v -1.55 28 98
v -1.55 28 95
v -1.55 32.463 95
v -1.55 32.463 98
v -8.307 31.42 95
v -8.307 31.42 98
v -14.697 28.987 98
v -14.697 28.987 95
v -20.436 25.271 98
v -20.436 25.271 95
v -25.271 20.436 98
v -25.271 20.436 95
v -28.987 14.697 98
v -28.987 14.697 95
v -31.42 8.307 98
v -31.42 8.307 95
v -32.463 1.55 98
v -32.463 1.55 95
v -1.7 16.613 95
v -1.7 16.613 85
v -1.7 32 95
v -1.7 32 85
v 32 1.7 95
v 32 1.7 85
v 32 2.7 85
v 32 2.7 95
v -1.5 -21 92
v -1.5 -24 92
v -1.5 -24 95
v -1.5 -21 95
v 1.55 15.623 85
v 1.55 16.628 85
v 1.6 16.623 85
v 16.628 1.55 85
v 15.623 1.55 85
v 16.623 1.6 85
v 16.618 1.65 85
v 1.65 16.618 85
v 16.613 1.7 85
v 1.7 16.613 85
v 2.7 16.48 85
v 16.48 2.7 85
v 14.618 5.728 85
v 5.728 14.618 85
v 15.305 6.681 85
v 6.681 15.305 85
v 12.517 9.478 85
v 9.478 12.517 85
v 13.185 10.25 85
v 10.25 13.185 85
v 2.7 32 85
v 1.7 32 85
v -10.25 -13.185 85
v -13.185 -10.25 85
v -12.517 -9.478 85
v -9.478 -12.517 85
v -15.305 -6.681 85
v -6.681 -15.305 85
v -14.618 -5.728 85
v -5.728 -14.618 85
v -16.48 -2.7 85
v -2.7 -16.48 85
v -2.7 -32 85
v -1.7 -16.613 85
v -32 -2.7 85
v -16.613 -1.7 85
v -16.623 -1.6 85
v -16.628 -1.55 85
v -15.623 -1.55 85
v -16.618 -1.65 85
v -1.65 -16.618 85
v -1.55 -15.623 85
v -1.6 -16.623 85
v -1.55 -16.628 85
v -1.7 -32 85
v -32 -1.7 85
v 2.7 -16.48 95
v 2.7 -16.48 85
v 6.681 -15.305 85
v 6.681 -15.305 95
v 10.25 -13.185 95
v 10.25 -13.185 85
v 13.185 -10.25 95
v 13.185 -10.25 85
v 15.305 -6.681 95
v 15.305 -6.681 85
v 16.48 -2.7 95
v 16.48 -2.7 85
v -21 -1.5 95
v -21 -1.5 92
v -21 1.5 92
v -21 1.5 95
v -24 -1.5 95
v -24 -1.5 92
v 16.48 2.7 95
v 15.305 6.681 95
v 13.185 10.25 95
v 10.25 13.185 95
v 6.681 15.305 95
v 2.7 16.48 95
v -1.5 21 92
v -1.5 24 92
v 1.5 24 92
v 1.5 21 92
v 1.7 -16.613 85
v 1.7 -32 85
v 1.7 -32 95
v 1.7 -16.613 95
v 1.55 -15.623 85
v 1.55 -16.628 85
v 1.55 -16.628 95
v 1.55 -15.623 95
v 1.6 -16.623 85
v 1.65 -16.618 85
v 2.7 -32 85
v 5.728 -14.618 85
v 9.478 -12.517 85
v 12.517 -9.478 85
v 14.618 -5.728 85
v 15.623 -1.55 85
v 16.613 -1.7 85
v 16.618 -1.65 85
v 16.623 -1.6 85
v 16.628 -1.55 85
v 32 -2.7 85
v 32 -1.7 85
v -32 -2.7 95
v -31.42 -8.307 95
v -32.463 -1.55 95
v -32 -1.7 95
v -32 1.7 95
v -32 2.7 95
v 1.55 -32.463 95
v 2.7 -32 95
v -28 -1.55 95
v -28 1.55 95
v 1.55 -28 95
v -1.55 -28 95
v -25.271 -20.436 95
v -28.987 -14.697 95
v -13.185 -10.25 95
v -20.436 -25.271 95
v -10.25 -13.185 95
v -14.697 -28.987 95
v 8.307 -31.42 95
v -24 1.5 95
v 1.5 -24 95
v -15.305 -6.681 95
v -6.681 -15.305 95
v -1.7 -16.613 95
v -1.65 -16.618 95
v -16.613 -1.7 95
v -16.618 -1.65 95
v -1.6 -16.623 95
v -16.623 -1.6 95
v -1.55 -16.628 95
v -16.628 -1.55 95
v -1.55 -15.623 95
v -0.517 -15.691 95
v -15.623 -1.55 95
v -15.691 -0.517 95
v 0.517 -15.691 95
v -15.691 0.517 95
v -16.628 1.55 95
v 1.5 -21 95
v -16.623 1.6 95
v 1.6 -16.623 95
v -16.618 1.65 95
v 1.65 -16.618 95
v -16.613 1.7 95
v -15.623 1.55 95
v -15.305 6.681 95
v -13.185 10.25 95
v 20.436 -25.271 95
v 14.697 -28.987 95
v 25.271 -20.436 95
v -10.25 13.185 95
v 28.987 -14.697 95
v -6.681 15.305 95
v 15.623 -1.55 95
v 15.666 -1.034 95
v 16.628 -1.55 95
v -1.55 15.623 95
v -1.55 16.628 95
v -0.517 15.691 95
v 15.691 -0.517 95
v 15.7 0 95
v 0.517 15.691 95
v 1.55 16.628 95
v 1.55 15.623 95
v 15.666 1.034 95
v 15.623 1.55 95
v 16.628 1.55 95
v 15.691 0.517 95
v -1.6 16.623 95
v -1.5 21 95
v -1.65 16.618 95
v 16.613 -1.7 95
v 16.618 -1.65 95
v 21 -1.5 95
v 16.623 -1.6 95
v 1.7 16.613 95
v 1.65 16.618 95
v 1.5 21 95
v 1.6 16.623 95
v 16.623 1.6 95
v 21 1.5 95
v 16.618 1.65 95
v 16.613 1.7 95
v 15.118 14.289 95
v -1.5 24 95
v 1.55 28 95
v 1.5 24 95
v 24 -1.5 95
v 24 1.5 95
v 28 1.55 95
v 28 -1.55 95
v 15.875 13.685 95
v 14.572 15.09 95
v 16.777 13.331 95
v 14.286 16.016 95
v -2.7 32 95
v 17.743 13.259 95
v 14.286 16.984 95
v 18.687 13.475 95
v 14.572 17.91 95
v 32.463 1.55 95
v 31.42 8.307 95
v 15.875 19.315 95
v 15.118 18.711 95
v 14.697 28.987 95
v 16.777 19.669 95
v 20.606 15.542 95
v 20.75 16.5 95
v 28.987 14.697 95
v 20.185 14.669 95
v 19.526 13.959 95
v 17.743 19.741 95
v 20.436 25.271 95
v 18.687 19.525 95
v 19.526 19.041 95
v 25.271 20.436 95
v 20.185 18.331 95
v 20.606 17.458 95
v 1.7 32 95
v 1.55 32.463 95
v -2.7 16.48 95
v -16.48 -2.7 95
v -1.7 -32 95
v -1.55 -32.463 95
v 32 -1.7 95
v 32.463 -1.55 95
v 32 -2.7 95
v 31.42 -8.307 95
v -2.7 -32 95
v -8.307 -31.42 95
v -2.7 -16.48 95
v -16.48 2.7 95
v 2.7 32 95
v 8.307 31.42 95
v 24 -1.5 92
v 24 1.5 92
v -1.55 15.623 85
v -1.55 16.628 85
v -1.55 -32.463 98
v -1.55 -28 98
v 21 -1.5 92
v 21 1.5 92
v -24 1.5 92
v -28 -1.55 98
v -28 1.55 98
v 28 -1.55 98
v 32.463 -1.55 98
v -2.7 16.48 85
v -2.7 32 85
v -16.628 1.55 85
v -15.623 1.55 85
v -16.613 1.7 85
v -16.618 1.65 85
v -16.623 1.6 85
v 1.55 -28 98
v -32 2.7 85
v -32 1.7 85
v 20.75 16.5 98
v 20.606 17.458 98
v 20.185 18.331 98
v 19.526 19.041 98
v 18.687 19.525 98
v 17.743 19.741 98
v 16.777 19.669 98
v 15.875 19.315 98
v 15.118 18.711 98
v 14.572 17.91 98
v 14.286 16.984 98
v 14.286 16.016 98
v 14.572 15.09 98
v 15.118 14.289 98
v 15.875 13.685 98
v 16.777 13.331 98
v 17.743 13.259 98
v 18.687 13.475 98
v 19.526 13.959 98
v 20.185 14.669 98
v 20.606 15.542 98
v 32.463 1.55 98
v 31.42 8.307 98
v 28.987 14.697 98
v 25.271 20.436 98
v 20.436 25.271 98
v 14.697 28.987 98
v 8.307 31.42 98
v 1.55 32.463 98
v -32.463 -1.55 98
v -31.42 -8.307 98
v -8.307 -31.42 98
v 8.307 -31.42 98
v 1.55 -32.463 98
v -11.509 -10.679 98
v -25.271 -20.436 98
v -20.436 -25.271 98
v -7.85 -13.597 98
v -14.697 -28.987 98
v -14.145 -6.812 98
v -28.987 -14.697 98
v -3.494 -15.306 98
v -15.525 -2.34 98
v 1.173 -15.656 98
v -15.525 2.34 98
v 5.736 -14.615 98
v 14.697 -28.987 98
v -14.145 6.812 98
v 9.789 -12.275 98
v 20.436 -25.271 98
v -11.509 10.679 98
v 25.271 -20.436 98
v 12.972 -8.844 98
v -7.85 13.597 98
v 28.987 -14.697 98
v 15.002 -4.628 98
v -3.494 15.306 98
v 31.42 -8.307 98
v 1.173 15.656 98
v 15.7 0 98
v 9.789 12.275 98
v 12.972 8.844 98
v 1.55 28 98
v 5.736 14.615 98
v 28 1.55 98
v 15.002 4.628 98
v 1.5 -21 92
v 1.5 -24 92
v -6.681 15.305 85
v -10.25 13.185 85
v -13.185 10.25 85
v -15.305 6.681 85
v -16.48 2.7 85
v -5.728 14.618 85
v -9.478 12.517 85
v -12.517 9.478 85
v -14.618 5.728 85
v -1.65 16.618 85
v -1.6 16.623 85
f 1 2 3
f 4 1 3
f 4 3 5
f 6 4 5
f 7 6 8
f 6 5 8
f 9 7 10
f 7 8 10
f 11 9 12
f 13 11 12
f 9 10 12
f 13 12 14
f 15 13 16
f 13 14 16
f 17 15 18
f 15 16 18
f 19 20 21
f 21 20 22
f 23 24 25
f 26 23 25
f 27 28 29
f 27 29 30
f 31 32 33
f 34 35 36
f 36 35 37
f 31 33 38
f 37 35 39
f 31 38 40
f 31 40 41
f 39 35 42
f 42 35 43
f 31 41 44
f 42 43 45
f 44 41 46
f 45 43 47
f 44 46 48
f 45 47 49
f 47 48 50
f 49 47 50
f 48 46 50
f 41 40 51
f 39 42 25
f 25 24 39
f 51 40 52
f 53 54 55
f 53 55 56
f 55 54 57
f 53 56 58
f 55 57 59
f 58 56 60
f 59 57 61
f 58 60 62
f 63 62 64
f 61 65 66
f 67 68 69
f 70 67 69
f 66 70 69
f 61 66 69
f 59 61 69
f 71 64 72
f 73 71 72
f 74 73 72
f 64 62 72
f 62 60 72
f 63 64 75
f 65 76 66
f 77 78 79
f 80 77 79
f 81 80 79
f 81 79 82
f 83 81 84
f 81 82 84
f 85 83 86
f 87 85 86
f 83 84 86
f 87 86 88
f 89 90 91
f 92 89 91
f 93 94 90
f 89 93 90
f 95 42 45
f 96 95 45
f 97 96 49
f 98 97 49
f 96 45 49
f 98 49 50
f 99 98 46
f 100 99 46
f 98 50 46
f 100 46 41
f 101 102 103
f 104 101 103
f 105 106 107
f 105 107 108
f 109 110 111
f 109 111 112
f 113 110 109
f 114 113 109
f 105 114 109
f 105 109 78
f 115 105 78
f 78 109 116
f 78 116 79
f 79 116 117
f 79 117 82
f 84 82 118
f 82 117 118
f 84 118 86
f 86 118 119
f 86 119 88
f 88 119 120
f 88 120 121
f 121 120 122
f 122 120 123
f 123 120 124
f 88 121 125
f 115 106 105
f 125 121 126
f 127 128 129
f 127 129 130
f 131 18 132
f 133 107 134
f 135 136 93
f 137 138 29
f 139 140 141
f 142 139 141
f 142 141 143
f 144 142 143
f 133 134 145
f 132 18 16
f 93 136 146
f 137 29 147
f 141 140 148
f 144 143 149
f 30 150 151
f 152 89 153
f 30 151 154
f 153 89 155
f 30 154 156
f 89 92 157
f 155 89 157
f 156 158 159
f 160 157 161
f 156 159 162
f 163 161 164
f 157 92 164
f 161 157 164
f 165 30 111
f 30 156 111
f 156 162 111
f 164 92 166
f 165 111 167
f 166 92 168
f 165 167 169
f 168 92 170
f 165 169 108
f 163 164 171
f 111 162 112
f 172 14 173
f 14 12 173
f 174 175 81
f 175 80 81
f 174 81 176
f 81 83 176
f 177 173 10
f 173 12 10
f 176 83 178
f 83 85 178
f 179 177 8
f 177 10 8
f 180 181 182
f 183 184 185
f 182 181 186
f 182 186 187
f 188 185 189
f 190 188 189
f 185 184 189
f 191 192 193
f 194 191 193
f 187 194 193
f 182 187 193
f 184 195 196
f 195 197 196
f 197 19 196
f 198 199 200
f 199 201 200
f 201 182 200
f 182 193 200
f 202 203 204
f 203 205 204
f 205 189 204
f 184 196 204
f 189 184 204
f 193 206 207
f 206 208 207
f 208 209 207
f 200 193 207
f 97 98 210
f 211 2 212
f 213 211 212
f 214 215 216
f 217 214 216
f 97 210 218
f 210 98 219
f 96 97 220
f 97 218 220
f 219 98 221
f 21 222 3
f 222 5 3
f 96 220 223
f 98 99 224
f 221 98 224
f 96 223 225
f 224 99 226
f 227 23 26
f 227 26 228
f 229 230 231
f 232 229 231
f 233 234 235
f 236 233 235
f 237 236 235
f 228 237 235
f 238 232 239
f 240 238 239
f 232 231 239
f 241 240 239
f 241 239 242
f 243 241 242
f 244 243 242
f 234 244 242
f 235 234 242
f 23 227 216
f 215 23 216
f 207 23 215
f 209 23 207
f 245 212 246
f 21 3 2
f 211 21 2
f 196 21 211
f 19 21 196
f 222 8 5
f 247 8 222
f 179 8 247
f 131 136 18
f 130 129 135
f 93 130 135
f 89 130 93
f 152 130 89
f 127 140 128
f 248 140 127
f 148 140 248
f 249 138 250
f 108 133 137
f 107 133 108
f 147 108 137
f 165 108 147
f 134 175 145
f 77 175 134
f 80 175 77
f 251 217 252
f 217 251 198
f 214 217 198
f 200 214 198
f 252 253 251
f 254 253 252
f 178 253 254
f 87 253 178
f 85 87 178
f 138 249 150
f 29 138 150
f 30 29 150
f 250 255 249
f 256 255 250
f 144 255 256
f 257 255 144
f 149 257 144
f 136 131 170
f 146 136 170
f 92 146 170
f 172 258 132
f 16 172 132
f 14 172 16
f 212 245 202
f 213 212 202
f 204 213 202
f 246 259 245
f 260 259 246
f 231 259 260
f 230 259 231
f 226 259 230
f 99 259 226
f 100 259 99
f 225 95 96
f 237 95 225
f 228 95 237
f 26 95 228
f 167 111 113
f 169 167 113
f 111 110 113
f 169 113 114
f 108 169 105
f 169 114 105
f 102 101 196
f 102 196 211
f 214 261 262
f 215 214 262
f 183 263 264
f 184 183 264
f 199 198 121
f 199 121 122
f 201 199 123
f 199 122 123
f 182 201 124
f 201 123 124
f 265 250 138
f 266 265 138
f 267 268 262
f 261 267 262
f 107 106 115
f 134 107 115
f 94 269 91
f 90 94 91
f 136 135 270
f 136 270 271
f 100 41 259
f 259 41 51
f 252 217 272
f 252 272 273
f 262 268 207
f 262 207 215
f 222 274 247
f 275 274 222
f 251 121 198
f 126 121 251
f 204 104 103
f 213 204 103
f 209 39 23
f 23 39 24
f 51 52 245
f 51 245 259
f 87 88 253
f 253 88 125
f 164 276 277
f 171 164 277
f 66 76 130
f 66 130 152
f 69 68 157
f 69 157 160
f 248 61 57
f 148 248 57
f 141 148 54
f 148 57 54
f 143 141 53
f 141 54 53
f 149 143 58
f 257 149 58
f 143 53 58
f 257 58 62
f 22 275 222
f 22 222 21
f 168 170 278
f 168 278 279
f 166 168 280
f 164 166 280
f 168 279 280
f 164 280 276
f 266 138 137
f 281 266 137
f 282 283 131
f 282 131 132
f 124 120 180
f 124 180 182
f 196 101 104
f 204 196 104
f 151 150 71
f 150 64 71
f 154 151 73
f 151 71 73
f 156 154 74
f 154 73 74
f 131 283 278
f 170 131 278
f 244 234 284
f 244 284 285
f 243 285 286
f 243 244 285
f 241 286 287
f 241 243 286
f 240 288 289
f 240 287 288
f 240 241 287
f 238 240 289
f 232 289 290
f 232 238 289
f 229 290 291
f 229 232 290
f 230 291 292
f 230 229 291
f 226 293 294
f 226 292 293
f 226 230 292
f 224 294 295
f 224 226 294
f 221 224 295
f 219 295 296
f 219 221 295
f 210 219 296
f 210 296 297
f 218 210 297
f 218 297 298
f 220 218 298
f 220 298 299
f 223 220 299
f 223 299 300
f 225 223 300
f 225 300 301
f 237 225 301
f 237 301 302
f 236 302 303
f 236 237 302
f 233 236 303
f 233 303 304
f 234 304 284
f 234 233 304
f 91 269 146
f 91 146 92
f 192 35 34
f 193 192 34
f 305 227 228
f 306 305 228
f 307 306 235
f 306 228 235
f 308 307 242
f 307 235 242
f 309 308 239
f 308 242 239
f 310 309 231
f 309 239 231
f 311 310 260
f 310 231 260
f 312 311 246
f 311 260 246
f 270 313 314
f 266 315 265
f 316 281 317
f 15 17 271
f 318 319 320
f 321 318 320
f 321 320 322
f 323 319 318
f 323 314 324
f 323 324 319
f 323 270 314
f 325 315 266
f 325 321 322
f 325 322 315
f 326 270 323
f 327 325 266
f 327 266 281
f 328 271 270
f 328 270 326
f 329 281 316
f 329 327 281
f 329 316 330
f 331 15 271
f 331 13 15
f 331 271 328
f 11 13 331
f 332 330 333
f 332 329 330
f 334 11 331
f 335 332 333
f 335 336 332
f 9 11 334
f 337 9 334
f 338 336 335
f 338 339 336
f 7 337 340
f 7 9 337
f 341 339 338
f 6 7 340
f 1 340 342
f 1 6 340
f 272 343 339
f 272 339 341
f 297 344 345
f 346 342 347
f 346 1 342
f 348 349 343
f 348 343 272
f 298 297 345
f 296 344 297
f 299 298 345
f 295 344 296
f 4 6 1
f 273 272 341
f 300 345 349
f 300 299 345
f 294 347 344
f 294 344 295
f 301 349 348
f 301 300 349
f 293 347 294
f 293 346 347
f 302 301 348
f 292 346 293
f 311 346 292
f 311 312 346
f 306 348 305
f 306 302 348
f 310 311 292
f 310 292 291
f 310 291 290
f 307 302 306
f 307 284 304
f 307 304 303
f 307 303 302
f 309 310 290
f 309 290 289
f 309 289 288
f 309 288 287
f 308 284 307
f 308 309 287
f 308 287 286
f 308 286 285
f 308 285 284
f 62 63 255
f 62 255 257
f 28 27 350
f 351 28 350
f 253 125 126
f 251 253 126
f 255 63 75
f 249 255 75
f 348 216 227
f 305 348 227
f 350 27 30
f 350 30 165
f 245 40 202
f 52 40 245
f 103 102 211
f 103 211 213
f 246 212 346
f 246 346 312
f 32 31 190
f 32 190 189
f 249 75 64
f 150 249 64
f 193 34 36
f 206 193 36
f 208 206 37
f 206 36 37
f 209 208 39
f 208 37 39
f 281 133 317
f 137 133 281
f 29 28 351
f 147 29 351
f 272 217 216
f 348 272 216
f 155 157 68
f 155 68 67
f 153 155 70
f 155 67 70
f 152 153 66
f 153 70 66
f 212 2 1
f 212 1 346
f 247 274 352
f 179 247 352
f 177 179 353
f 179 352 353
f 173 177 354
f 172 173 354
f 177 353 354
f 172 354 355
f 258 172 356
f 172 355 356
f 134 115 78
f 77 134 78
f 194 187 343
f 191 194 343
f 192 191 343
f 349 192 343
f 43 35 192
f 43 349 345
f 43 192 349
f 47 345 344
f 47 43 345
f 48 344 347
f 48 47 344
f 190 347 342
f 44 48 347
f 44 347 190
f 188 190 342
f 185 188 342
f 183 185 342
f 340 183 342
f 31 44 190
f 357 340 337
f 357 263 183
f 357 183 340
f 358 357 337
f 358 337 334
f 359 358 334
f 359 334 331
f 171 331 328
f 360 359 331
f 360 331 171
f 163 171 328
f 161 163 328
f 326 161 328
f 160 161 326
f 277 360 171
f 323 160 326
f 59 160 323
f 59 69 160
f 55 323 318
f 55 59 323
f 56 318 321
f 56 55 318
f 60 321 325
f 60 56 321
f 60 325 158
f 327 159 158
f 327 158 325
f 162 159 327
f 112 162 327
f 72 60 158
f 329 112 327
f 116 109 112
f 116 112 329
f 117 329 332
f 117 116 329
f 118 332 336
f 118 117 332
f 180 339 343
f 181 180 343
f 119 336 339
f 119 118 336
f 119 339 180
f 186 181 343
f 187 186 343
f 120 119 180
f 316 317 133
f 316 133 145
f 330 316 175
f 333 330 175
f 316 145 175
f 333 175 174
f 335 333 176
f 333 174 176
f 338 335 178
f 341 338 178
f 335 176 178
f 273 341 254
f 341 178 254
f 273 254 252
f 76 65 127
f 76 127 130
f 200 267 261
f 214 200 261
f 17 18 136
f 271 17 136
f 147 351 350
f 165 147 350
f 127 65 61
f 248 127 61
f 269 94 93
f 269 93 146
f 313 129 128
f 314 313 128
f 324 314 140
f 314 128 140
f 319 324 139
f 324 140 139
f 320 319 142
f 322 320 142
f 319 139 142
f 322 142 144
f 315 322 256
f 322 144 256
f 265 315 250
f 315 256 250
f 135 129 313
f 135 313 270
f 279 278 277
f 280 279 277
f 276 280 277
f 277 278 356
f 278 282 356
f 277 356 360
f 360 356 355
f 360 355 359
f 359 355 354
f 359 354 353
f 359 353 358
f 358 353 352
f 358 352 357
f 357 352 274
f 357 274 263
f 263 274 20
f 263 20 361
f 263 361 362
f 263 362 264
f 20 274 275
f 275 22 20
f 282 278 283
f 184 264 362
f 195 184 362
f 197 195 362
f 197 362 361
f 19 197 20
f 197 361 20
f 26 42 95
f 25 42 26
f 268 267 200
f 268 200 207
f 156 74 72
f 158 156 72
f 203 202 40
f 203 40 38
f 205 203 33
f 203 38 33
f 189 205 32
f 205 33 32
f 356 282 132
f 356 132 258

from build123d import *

# Parameters (mm, degrees)
CYLINDER_R     = 3.25
CYLINDER_DEPTH = 10
BOX030_W       = 3
BOX030_H       = 3
BOX030_DEPTH   = 3
BOX047_W       = 3
BOX047_H       = 3
BOX047_DEPTH   = 3
BOX029_W       = 3
BOX029_H       = 3
BOX029_DEPTH   = 3
BOX028_W       = 3
BOX028_H       = 3
BOX028_DEPTH   = 3
BOX043_W       = 3.1
BOX043_H       = 6
BOX043_DEPTH   = 10
BOX044_W       = 3.1
BOX044_H       = 6
BOX044_DEPTH   = 10
BOX045_W       = 6
BOX045_H       = 3.1
BOX045_DEPTH   = 10
BOX046_W       = 6
BOX046_H       = 3.1
BOX046_DEPTH   = 10
BOX032_W       = 3.1
BOX032_H       = 6
BOX032_DEPTH   = 3
BOX033_W       = 6
BOX033_H       = 3.1
BOX033_DEPTH   = 3
BOX034_W       = 6
BOX034_H       = 3.1
BOX034_DEPTH   = 3
BOX031_W       = 3.1
BOX031_H       = 6
BOX031_DEPTH   = 3
TUBE003_R      = 16.7
TUBE003_R_2    = 15.7
TUBE003_DEPTH  = 10
BOX036_W       = 1
BOX036_H       = 16
BOX036_DEPTH   = 10
BOX037_W       = 1
BOX037_H       = 16
BOX037_DEPTH   = 10
BOX038_W       = 1
BOX038_H       = 16
BOX038_DEPTH   = 10
BOX039_W       = 16
BOX039_H       = 1
BOX039_DEPTH   = 10
BOX040_W       = 16
BOX040_H       = 1
BOX040_DEPTH   = 10
BOX041_W       = 16
BOX041_H       = 1
BOX041_DEPTH   = 10
BOX042_W       = 16
BOX042_H       = 1
BOX042_DEPTH   = 10
BOX035_W       = 1
BOX035_H       = 16
BOX035_DEPTH   = 10
TUBE002_R      = 32.5
TUBE002_R_2    = 15.7
TUBE002_DEPTH  = 3


with BuildPart() as eyeboltcutout:
    # Cylinder → Cylinder (new body)
    with BuildSketch(Plane(origin=(17.5, 16.5, 91), x_dir=(1, 0, 0), z_dir=(0, 0, 1))):
        Circle(CYLINDER_R)
    extrude(amount=CYLINDER_DEPTH)


with BuildPart() as finlock015:
    # Box030 → Box030 (new body)
    with BuildSketch(Plane(origin=(-1.5, 21, -3), x_dir=(1, 0, 0), z_dir=(0, 0, 1))):
        with Locations((1.5, 1.5)):
            Rectangle(BOX030_W, BOX030_H)
    extrude(amount=BOX030_DEPTH)


with BuildPart() as finlock016:
    # Box047 → Box047 (new body)
    with BuildSketch(Plane(origin=(-1.5, -24, -3), x_dir=(1, 0, 0), z_dir=(0, 0, 1))):
        with Locations((1.5, 1.5)):
            Rectangle(BOX047_W, BOX047_H)
    extrude(amount=BOX047_DEPTH)


with BuildPart() as finlock014:
    # Box029 → Box029 (new body)
    with BuildSketch(Plane(origin=(-24, -1.5, -3), x_dir=(1, 0, 0), z_dir=(0, 0, 1))):
        with Locations((1.5, 1.5)):
            Rectangle(BOX029_W, BOX029_H)
    extrude(amount=BOX029_DEPTH)


with BuildPart() as finlocks001:
    # Box028 → Box028 (new body)
    with BuildSketch(Plane(origin=(21, -1.5, -3), x_dir=(1, 0, 0), z_dir=(0, 0, 1))):
        with Locations((1.5, 1.5)):
            Rectangle(BOX028_W, BOX028_H)
    extrude(amount=BOX028_DEPTH)

    # Fusion014: union FinLock015, FinLock016, FinLock014
    add(finlock015.part)
    add(finlock016.part)
    add(finlock014.part)


with BuildPart() as fincut013:
    # Box043 → Box043 (new body)
    with BuildSketch(Plane(origin=(-1.55, -21, -10), x_dir=(1, 0, 0), z_dir=(0, 0, 1))):
        with Locations((1.55, 3)):
            Rectangle(BOX043_W, BOX043_H)
    extrude(amount=BOX043_DEPTH)


with BuildPart() as fincut014:
    # Box044 → Box044 (new body)
    with BuildSketch(Plane(origin=(-1.55, 15, -10), x_dir=(1, 0, 0), z_dir=(0, 0, 1))):
        with Locations((1.55, 3)):
            Rectangle(BOX044_W, BOX044_H)
    extrude(amount=BOX044_DEPTH)


with BuildPart() as fincut015:
    # Box045 → Box045 (new body)
    with BuildSketch(Plane(origin=(15, -1.55, -10), x_dir=(1, 0, 0), z_dir=(0, 0, 1))):
        with Locations((3, 1.55)):
            Rectangle(BOX045_W, BOX045_H)
    extrude(amount=BOX045_DEPTH)


with BuildPart() as innerfincutouts001:
    # Box046 → Box046 (new body)
    with BuildSketch(Plane(origin=(-21, -1.55, -10), x_dir=(1, 0, 0), z_dir=(0, 0, 1))):
        with Locations((3, 1.55)):
            Rectangle(BOX046_W, BOX046_H)
    extrude(amount=BOX046_DEPTH)

    # Fusion011: union FinCut013, FinCut014, FinCut015
    add(fincut013.part)
    add(fincut014.part)
    add(fincut015.part)


with BuildPart() as fincut010:
    # Box032 → Box032 (new body)
    with BuildSketch(Plane(origin=(-1.55, 28, 0), x_dir=(1, 0, 0), z_dir=(0, 0, 1))):
        with Locations((1.55, 3)):
            Rectangle(BOX032_W, BOX032_H)
    extrude(amount=BOX032_DEPTH)


with BuildPart() as fincut011:
    # Box033 → Box033 (new body)
    with BuildSketch(Plane(origin=(28, -1.55, 0), x_dir=(1, 0, 0), z_dir=(0, 0, 1))):
        with Locations((3, 1.55)):
            Rectangle(BOX033_W, BOX033_H)
    extrude(amount=BOX033_DEPTH)


with BuildPart() as fincut012:
    # Box034 → Box034 (new body)
    with BuildSketch(Plane(origin=(-34, -1.55, 0), x_dir=(1, 0, 0), z_dir=(0, 0, 1))):
        with Locations((3, 1.55)):
            Rectangle(BOX034_W, BOX034_H)
    extrude(amount=BOX034_DEPTH)


with BuildPart() as fincutouts001:
    # Box031 → Box031 (new body)
    with BuildSketch(Plane(origin=(-1.55, -34, 0), x_dir=(1, 0, 0), z_dir=(0, 0, 1))):
        with Locations((1.55, 3)):
            Rectangle(BOX031_W, BOX031_H)
    extrude(amount=BOX031_DEPTH)

    # Fusion009: union FinCut010, FinCut011, FinCut012
    add(fincut010.part)
    add(fincut011.part)
    add(fincut012.part)

    # Fusion012: union InnerFinCutouts001
    add(innerfincutouts001.part)


with BuildPart() as innertube001:
    # Tube003 → Tube003 (new body)
    with BuildSketch(Plane.XY.offset(-10)):
        Circle(TUBE003_R)
        Circle(TUBE003_R_2, mode=Mode.SUBTRACT)
    extrude(amount=TUBE003_DEPTH)


with BuildPart() as alignment010:
    # Box036 → Box036 (new body)
    with BuildSketch(Plane(origin=(-2.7, 16, -10), x_dir=(1, 0, 0), z_dir=(0, 0, 1))):
        with Locations((0.5, 8)):
            Rectangle(BOX036_W, BOX036_H)
    extrude(amount=BOX036_DEPTH)


with BuildPart() as alignment011:
    # Box037 → Box037 (new body)
    with BuildSketch(Plane(origin=(-2.7, -32, -10), x_dir=(1, 0, 0), z_dir=(0, 0, 1))):
        with Locations((0.5, 8)):
            Rectangle(BOX037_W, BOX037_H)
    extrude(amount=BOX037_DEPTH)


with BuildPart() as alignment012:
    # Box038 → Box038 (new body)
    with BuildSketch(Plane(origin=(1.7, -32, -10), x_dir=(1, 0, 0), z_dir=(0, 0, 1))):
        with Locations((0.5, 8)):
            Rectangle(BOX038_W, BOX038_H)
    extrude(amount=BOX038_DEPTH)


with BuildPart() as alignment013:
    # Box039 → Box039 (new body)
    with BuildSketch(Plane(origin=(16, 1.7, -10), x_dir=(1, 0, 0), z_dir=(0, 0, 1))):
        with Locations((8, 0.5)):
            Rectangle(BOX039_W, BOX039_H)
    extrude(amount=BOX039_DEPTH)


with BuildPart() as alignment014:
    # Box040 → Box040 (new body)
    with BuildSketch(Plane(origin=(16, -2.7, -10), x_dir=(1, 0, 0), z_dir=(0, 0, 1))):
        with Locations((8, 0.5)):
            Rectangle(BOX040_W, BOX040_H)
    extrude(amount=BOX040_DEPTH)


with BuildPart() as alignment015:
    # Box041 → Box041 (new body)
    with BuildSketch(Plane(origin=(-32, 1.7, -10), x_dir=(1, 0, 0), z_dir=(0, 0, 1))):
        with Locations((8, 0.5)):
            Rectangle(BOX041_W, BOX041_H)
    extrude(amount=BOX041_DEPTH)


with BuildPart() as alignment016:
    # Box042 → Box042 (new body)
    with BuildSketch(Plane(origin=(-32, -2.7, -10), x_dir=(1, 0, 0), z_dir=(0, 0, 1))):
        with Locations((8, 0.5)):
            Rectangle(BOX042_W, BOX042_H)
    extrude(amount=BOX042_DEPTH)


with BuildPart() as alignmenttabs001:
    # Box035 → Box035 (new body)
    with BuildSketch(Plane(origin=(1.7, 16, -10), x_dir=(1, 0, 0), z_dir=(0, 0, 1))):
        with Locations((0.5, 8)):
            Rectangle(BOX035_W, BOX035_H)
    extrude(amount=BOX035_DEPTH)

    # Fusion010: union Alignment010, Alignment011, Alignment012, Alignment013, Alignment014, Alignment015, Alignment016
    add(alignment010.part)
    add(alignment011.part)
    add(alignment012.part)
    add(alignment013.part)
    add(alignment014.part)
    add(alignment015.part)
    add(alignment016.part)


with BuildPart() as cut004:
    # Tube002 → Tube002 (new body)
    with BuildSketch(Plane.XY):
        Circle(TUBE002_R)
        Circle(TUBE002_R_2, mode=Mode.SUBTRACT)
    extrude(amount=TUBE002_DEPTH)

    # Fusion013: union InnerTube001, AlignmentTabs001
    add(innertube001.part)
    add(alignmenttabs001.part)

    # Cut003: cut FinCutouts001
    add(fincutouts001.part, mode=Mode.SUBTRACT)

    # Connect001: union FinLocks001
    add(finlocks001.part)


with BuildPart() as cut004_1:
    # Connect001 placement: moved
    add(cut004.part.moved(Location((0, 0, 95))))

    # Cut004: cut EyeboltCutout
    add(eyeboltcutout.part, mode=Mode.SUBTRACT)


solid = cut004_1.part
